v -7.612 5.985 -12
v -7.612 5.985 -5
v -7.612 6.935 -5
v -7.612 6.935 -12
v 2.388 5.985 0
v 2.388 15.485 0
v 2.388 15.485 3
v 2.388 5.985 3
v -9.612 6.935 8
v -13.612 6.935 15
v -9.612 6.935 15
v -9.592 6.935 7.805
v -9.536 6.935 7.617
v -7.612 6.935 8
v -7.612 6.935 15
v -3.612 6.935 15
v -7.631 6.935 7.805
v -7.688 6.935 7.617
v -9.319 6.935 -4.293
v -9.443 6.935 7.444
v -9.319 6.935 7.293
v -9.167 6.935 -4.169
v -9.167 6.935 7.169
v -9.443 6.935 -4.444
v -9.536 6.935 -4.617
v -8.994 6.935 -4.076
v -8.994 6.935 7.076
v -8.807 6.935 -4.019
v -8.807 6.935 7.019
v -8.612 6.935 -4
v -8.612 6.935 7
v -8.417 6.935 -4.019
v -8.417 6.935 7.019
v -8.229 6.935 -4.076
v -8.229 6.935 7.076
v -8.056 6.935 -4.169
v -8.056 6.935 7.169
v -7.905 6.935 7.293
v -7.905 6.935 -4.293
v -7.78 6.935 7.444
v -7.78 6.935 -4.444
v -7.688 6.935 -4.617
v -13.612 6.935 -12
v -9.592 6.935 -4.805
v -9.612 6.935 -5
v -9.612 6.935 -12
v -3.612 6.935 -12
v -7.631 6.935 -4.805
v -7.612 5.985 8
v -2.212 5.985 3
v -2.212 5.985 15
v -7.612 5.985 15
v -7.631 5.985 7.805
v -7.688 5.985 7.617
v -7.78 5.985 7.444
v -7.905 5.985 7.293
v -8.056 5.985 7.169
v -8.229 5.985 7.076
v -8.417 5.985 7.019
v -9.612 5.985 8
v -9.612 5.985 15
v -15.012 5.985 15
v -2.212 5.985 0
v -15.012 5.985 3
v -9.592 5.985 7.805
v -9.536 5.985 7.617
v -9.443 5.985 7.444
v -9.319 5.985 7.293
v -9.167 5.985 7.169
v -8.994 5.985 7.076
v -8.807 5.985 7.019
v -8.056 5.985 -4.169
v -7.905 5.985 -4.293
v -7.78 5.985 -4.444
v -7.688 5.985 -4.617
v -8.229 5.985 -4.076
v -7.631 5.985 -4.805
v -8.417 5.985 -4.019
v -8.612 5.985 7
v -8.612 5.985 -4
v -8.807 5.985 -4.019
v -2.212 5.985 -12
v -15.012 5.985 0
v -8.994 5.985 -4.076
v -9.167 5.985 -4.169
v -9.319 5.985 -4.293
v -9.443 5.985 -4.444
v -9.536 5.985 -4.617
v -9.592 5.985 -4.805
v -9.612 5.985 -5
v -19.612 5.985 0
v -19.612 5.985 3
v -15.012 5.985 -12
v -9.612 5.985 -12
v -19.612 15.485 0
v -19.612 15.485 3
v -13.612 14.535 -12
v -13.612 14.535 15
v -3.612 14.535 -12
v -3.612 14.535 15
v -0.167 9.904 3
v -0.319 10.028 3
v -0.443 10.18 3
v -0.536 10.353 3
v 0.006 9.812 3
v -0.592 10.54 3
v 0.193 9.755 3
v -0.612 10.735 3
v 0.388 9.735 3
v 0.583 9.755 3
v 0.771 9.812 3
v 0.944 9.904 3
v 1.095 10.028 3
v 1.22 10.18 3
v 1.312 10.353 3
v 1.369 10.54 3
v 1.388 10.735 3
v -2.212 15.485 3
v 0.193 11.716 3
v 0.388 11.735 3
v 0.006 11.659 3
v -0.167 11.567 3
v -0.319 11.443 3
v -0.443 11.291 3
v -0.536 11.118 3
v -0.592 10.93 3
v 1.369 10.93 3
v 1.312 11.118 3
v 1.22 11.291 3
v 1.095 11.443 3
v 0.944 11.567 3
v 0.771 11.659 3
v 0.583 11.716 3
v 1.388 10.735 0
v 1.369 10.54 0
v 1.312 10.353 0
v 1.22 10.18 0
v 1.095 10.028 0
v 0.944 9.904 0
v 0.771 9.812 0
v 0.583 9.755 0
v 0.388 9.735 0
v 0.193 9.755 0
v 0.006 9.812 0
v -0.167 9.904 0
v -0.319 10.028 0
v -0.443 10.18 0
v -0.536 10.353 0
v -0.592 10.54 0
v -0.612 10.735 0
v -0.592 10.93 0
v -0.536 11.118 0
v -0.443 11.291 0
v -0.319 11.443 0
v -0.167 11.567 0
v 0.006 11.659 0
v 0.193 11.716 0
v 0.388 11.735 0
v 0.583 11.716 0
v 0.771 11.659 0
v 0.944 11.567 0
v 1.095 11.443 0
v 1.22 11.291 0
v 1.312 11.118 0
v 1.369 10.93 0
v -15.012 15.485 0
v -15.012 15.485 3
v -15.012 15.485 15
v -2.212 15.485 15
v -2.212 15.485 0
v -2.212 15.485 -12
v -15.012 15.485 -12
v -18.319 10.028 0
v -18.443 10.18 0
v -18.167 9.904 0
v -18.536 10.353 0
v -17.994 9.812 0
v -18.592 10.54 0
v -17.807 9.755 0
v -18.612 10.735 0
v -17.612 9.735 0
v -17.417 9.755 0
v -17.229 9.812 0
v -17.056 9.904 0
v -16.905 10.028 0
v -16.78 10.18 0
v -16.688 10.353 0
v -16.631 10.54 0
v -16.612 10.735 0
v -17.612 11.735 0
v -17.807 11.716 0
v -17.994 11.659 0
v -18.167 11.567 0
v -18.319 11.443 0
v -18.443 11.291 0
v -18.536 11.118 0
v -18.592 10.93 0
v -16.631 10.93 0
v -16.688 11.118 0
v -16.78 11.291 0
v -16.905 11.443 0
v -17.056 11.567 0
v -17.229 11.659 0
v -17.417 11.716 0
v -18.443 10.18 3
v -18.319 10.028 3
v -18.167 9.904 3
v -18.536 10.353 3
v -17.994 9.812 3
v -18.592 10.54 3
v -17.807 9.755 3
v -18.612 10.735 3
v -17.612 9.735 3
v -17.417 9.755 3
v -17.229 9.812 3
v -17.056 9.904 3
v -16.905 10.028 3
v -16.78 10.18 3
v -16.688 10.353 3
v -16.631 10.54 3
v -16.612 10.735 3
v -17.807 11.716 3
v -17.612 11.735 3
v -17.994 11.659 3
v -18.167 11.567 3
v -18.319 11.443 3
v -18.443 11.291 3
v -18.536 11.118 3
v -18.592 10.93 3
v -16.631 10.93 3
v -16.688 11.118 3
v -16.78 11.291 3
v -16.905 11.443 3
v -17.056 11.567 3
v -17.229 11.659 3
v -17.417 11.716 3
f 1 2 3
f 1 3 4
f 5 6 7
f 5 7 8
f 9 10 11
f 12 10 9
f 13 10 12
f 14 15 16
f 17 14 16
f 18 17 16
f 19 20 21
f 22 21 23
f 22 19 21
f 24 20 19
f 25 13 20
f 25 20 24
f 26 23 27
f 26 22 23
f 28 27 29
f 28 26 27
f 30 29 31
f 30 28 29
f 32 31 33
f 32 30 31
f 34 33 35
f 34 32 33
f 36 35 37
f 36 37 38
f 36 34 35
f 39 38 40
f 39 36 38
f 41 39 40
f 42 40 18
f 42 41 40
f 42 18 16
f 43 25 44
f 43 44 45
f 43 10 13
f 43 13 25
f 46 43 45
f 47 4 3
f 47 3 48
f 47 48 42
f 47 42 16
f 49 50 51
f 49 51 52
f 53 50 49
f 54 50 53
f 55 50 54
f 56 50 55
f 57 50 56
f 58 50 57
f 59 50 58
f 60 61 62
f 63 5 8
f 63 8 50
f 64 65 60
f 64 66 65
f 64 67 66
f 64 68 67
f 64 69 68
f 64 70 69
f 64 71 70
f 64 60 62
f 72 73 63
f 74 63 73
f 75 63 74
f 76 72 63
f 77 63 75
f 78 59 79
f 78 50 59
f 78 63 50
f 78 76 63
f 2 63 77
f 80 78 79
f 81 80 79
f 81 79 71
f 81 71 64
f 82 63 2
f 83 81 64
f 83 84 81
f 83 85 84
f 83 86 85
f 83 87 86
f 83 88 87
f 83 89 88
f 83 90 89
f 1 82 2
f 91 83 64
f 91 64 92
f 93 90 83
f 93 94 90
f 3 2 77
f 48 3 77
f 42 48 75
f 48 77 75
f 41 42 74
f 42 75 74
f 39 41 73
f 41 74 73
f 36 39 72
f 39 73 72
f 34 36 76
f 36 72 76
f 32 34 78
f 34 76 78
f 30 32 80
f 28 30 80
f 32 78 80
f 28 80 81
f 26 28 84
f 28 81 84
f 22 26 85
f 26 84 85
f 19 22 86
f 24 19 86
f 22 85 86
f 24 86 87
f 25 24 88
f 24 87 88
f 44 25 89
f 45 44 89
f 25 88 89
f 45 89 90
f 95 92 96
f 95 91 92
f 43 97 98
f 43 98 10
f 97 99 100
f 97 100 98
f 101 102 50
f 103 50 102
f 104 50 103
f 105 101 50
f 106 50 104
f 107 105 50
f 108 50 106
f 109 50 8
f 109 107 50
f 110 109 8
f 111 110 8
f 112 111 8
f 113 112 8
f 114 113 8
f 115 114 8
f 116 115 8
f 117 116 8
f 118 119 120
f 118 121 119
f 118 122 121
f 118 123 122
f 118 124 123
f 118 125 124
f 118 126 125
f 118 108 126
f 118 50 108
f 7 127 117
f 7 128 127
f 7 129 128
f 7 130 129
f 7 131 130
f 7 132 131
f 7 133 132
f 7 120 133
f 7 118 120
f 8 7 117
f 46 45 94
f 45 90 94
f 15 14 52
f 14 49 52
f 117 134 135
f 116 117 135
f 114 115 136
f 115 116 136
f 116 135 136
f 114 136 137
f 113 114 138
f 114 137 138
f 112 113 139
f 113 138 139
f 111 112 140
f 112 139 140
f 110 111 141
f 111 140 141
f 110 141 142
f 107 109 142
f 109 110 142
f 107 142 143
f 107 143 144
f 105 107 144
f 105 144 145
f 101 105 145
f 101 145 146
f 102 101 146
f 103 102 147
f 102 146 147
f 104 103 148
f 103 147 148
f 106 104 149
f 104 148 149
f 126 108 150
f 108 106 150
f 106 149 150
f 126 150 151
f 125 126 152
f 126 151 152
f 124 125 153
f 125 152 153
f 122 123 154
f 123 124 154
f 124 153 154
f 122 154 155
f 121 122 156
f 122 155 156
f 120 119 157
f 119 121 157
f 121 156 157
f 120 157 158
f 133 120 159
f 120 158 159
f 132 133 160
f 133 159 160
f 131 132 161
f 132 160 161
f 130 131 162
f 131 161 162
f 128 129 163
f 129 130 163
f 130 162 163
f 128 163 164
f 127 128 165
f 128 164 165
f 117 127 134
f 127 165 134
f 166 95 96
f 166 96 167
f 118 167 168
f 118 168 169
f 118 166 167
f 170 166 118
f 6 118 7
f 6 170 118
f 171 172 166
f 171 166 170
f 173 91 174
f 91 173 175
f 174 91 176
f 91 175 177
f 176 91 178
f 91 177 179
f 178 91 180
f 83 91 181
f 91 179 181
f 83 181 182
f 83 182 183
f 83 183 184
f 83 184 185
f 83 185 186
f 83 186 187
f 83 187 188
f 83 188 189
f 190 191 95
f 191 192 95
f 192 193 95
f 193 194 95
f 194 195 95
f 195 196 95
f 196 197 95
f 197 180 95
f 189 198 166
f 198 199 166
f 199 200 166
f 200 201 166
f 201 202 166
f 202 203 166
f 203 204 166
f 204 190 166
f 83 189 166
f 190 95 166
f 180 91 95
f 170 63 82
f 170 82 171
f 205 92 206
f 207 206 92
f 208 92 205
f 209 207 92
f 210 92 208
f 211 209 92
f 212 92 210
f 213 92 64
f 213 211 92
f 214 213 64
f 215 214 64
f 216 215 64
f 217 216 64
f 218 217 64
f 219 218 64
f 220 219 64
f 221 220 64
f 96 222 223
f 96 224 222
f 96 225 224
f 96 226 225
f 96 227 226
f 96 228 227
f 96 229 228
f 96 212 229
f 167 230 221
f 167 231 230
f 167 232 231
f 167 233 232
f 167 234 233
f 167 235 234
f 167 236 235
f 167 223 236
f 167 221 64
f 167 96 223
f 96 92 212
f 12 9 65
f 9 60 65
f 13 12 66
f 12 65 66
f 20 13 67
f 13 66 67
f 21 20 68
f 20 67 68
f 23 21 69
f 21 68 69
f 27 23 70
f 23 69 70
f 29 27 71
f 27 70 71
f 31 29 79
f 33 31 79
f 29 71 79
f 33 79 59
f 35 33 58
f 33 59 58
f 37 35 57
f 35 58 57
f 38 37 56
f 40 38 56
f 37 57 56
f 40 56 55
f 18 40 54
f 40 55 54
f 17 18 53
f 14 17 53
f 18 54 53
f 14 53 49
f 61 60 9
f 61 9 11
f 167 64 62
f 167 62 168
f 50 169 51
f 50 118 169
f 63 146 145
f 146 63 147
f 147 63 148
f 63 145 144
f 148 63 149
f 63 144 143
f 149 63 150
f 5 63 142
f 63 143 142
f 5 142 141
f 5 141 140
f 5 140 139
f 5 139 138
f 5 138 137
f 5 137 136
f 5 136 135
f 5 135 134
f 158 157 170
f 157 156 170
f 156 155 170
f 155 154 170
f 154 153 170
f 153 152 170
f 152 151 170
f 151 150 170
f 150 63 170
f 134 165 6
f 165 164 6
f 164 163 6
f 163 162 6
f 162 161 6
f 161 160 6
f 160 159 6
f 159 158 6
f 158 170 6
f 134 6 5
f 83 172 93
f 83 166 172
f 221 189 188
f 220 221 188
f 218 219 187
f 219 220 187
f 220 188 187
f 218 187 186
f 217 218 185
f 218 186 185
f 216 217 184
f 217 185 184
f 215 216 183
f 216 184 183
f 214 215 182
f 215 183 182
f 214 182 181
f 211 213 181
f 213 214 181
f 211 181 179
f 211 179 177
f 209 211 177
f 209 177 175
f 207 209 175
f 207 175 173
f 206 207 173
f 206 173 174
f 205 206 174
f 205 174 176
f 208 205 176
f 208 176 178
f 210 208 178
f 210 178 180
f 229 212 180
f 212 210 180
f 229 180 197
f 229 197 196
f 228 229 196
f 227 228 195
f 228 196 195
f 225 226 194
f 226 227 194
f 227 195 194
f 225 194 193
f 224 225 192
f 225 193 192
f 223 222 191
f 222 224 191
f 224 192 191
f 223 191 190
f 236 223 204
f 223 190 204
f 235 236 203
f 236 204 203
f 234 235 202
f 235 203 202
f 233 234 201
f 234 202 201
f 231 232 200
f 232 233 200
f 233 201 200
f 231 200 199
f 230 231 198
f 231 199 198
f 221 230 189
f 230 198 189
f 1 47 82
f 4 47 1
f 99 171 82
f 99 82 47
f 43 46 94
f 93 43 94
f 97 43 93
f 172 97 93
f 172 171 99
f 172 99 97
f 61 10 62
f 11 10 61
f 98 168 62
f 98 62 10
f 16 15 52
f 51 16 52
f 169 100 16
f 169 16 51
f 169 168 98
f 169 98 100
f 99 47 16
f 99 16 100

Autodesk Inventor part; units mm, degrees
ref_plane "YZ Plane" through (0, 0, 0) normal (1, 0, 0) x (0, 1, 0)
ref_plane "XZ Plane" through (0, 0, 0) normal (0, 1, 0) x (-1, 0, 0)
ref_plane "XY Plane" through (0, 0, 0) normal (0, 0, 1) x (1, 0, 0)
sketch "Sketch1" plane through (0, 0, 0) normal (0, 0, 1) x (1, 0, 0)
  line L0 (-19.6117, 15.4854) -> (2.3883, 15.4854)
  line L1 (2.3883, 15.4854) -> (2.3883, 5.9854)
  line L2 (2.3883, 5.9854) -> (-19.6117, 5.9854)
  line L3 (-19.6117, 5.9854) -> (-19.6117, 15.4854)
  circle A0 centre (-17.6117, 10.7354) radius 1
  circle A1 centre (0.3883, 10.7354) radius 1
  point P0 (2.3883, 10.7354)
  dimension "d0" = 22
  dimension "d1" = 9.5
  dimension "d2" = 18
  dimension "d3" = 2
  dimension "d4" = 2
extrude "Extrusion1" add sketch "Sketch1" along normal blind 3
sketch "Sketch2" plane through (0, 0, 3) normal (0, 0, 1) x (1, 0, 0)
  line L0 (-19.6117, 15.4854) -> (2.3883, 15.4854) projected
  line L1 (-19.6117, 5.9854) -> (-19.6117, 15.4854) projected
  line L2 (2.3883, 5.9854) -> (-19.6117, 5.9854) projected
  line L3 (-15.0117, 15.4854) -> (-2.2117, 15.4854)
  line L4 (-2.2117, 15.4854) -> (-2.2117, 5.9854)
  line L5 (-2.2117, 5.9854) -> (-15.0117, 5.9854)
  line L6 (-15.0117, 5.9854) -> (-15.0117, 15.4854)
  point P0 (0, 0)
  point P1 (-8.6117, 5.9854)
  point P2 (-8.6117, 5.9854)
  dimension "d7" = 12.8
extrude "Extrusion2" add sketch "Sketch2" along normal blind 12 contours L0 L4 L2 L6
sketch "Sketch3" plane through (0, 0, 0) normal (0, 0, -1) x (-1, 0, 0)
  line L0 (19.6117, 15.4854) -> (-2.3883, 15.4854) projected
  line L1 (-2.3883, 5.9854) -> (19.6117, 5.9854) projected
  line L2 (15.0117, 5.9854) -> (2.2117, 5.9854)
  line L3 (2.2117, 5.9854) -> (2.2117, 15.4854)
  line L4 (2.2117, 15.4854) -> (15.0117, 15.4854)
  line L5 (15.0117, 15.4854) -> (15.0117, 5.9854)
  point P0 (0, 0)
  point P1 (8.6117, 5.9854)
  point P2 (8.6117, 5.9854)
  dimension "d10" = 12.8
extrude "Extrusion3" add sketch "Sketch3" along normal blind 12
sketch "Sketch4" plane through (0, 0, -12) normal (0, 0, -1) x (-1, 0, 0)
  line L0 (2.2117, 5.9854) -> (2.2117, 15.4854) projected
  line L1 (15.0117, 5.9854) -> (2.2117, 5.9854) projected
  line L2 (13.6117, 6.9354) -> (3.6117, 6.9354)
  line L3 (3.6117, 6.9354) -> (3.6117, 14.5354)
  line L4 (3.6117, 14.5354) -> (13.6117, 14.5354)
  line L5 (13.6117, 14.5354) -> (13.6117, 6.9354)
  point P0 (0, 0)
  point P1 (8.6117, 5.9854)
  point P2 (8.6117, 6.9354)
  point P3 (3.6117, 10.7354)
  point P4 (2.2117, 10.7354)
  dimension "d13" = 10
  dimension "d14" = 7.6
extrude "Extrusion4" cut sketch "Sketch4" against normal blind 30
sketch "Sketch5" plane through (-19.6117, 5.9854, 0) normal (0, -1, 0) x (1, 0, 0)
  line L0 (17.4, 15) -> (4.6, 15) projected
  line L1 (4.6, 3) -> (4.6, 15) projected
  line L2 (4.6, 0) -> (4.6, -12) projected
  line L3 (4.6, -12) -> (17.4, -12) projected
  arc A0 (10, 8) -> (12, 8) centre (11, 8) ccw
  arc A1 (12, -5) -> (10, -5) centre (11, -5) ccw
  line L4 (10, 8) -> (10, 15)
  line L5 (12, 8) -> (12, 15)
  line L6 (10, -5) -> (10, -12)
  line L7 (12, -5) -> (12, -12)
  point P0 (19.6117, 0)
  point P1 (11, 15)
  dimension "d17" = 7
  dimension "d18" = 7
  dimension "d19" = 2
extrude "Extrusion5" cut sketch "Sketch5" against normal blind 3
properties part number "SC-adapter" material "ABS Plastic"
